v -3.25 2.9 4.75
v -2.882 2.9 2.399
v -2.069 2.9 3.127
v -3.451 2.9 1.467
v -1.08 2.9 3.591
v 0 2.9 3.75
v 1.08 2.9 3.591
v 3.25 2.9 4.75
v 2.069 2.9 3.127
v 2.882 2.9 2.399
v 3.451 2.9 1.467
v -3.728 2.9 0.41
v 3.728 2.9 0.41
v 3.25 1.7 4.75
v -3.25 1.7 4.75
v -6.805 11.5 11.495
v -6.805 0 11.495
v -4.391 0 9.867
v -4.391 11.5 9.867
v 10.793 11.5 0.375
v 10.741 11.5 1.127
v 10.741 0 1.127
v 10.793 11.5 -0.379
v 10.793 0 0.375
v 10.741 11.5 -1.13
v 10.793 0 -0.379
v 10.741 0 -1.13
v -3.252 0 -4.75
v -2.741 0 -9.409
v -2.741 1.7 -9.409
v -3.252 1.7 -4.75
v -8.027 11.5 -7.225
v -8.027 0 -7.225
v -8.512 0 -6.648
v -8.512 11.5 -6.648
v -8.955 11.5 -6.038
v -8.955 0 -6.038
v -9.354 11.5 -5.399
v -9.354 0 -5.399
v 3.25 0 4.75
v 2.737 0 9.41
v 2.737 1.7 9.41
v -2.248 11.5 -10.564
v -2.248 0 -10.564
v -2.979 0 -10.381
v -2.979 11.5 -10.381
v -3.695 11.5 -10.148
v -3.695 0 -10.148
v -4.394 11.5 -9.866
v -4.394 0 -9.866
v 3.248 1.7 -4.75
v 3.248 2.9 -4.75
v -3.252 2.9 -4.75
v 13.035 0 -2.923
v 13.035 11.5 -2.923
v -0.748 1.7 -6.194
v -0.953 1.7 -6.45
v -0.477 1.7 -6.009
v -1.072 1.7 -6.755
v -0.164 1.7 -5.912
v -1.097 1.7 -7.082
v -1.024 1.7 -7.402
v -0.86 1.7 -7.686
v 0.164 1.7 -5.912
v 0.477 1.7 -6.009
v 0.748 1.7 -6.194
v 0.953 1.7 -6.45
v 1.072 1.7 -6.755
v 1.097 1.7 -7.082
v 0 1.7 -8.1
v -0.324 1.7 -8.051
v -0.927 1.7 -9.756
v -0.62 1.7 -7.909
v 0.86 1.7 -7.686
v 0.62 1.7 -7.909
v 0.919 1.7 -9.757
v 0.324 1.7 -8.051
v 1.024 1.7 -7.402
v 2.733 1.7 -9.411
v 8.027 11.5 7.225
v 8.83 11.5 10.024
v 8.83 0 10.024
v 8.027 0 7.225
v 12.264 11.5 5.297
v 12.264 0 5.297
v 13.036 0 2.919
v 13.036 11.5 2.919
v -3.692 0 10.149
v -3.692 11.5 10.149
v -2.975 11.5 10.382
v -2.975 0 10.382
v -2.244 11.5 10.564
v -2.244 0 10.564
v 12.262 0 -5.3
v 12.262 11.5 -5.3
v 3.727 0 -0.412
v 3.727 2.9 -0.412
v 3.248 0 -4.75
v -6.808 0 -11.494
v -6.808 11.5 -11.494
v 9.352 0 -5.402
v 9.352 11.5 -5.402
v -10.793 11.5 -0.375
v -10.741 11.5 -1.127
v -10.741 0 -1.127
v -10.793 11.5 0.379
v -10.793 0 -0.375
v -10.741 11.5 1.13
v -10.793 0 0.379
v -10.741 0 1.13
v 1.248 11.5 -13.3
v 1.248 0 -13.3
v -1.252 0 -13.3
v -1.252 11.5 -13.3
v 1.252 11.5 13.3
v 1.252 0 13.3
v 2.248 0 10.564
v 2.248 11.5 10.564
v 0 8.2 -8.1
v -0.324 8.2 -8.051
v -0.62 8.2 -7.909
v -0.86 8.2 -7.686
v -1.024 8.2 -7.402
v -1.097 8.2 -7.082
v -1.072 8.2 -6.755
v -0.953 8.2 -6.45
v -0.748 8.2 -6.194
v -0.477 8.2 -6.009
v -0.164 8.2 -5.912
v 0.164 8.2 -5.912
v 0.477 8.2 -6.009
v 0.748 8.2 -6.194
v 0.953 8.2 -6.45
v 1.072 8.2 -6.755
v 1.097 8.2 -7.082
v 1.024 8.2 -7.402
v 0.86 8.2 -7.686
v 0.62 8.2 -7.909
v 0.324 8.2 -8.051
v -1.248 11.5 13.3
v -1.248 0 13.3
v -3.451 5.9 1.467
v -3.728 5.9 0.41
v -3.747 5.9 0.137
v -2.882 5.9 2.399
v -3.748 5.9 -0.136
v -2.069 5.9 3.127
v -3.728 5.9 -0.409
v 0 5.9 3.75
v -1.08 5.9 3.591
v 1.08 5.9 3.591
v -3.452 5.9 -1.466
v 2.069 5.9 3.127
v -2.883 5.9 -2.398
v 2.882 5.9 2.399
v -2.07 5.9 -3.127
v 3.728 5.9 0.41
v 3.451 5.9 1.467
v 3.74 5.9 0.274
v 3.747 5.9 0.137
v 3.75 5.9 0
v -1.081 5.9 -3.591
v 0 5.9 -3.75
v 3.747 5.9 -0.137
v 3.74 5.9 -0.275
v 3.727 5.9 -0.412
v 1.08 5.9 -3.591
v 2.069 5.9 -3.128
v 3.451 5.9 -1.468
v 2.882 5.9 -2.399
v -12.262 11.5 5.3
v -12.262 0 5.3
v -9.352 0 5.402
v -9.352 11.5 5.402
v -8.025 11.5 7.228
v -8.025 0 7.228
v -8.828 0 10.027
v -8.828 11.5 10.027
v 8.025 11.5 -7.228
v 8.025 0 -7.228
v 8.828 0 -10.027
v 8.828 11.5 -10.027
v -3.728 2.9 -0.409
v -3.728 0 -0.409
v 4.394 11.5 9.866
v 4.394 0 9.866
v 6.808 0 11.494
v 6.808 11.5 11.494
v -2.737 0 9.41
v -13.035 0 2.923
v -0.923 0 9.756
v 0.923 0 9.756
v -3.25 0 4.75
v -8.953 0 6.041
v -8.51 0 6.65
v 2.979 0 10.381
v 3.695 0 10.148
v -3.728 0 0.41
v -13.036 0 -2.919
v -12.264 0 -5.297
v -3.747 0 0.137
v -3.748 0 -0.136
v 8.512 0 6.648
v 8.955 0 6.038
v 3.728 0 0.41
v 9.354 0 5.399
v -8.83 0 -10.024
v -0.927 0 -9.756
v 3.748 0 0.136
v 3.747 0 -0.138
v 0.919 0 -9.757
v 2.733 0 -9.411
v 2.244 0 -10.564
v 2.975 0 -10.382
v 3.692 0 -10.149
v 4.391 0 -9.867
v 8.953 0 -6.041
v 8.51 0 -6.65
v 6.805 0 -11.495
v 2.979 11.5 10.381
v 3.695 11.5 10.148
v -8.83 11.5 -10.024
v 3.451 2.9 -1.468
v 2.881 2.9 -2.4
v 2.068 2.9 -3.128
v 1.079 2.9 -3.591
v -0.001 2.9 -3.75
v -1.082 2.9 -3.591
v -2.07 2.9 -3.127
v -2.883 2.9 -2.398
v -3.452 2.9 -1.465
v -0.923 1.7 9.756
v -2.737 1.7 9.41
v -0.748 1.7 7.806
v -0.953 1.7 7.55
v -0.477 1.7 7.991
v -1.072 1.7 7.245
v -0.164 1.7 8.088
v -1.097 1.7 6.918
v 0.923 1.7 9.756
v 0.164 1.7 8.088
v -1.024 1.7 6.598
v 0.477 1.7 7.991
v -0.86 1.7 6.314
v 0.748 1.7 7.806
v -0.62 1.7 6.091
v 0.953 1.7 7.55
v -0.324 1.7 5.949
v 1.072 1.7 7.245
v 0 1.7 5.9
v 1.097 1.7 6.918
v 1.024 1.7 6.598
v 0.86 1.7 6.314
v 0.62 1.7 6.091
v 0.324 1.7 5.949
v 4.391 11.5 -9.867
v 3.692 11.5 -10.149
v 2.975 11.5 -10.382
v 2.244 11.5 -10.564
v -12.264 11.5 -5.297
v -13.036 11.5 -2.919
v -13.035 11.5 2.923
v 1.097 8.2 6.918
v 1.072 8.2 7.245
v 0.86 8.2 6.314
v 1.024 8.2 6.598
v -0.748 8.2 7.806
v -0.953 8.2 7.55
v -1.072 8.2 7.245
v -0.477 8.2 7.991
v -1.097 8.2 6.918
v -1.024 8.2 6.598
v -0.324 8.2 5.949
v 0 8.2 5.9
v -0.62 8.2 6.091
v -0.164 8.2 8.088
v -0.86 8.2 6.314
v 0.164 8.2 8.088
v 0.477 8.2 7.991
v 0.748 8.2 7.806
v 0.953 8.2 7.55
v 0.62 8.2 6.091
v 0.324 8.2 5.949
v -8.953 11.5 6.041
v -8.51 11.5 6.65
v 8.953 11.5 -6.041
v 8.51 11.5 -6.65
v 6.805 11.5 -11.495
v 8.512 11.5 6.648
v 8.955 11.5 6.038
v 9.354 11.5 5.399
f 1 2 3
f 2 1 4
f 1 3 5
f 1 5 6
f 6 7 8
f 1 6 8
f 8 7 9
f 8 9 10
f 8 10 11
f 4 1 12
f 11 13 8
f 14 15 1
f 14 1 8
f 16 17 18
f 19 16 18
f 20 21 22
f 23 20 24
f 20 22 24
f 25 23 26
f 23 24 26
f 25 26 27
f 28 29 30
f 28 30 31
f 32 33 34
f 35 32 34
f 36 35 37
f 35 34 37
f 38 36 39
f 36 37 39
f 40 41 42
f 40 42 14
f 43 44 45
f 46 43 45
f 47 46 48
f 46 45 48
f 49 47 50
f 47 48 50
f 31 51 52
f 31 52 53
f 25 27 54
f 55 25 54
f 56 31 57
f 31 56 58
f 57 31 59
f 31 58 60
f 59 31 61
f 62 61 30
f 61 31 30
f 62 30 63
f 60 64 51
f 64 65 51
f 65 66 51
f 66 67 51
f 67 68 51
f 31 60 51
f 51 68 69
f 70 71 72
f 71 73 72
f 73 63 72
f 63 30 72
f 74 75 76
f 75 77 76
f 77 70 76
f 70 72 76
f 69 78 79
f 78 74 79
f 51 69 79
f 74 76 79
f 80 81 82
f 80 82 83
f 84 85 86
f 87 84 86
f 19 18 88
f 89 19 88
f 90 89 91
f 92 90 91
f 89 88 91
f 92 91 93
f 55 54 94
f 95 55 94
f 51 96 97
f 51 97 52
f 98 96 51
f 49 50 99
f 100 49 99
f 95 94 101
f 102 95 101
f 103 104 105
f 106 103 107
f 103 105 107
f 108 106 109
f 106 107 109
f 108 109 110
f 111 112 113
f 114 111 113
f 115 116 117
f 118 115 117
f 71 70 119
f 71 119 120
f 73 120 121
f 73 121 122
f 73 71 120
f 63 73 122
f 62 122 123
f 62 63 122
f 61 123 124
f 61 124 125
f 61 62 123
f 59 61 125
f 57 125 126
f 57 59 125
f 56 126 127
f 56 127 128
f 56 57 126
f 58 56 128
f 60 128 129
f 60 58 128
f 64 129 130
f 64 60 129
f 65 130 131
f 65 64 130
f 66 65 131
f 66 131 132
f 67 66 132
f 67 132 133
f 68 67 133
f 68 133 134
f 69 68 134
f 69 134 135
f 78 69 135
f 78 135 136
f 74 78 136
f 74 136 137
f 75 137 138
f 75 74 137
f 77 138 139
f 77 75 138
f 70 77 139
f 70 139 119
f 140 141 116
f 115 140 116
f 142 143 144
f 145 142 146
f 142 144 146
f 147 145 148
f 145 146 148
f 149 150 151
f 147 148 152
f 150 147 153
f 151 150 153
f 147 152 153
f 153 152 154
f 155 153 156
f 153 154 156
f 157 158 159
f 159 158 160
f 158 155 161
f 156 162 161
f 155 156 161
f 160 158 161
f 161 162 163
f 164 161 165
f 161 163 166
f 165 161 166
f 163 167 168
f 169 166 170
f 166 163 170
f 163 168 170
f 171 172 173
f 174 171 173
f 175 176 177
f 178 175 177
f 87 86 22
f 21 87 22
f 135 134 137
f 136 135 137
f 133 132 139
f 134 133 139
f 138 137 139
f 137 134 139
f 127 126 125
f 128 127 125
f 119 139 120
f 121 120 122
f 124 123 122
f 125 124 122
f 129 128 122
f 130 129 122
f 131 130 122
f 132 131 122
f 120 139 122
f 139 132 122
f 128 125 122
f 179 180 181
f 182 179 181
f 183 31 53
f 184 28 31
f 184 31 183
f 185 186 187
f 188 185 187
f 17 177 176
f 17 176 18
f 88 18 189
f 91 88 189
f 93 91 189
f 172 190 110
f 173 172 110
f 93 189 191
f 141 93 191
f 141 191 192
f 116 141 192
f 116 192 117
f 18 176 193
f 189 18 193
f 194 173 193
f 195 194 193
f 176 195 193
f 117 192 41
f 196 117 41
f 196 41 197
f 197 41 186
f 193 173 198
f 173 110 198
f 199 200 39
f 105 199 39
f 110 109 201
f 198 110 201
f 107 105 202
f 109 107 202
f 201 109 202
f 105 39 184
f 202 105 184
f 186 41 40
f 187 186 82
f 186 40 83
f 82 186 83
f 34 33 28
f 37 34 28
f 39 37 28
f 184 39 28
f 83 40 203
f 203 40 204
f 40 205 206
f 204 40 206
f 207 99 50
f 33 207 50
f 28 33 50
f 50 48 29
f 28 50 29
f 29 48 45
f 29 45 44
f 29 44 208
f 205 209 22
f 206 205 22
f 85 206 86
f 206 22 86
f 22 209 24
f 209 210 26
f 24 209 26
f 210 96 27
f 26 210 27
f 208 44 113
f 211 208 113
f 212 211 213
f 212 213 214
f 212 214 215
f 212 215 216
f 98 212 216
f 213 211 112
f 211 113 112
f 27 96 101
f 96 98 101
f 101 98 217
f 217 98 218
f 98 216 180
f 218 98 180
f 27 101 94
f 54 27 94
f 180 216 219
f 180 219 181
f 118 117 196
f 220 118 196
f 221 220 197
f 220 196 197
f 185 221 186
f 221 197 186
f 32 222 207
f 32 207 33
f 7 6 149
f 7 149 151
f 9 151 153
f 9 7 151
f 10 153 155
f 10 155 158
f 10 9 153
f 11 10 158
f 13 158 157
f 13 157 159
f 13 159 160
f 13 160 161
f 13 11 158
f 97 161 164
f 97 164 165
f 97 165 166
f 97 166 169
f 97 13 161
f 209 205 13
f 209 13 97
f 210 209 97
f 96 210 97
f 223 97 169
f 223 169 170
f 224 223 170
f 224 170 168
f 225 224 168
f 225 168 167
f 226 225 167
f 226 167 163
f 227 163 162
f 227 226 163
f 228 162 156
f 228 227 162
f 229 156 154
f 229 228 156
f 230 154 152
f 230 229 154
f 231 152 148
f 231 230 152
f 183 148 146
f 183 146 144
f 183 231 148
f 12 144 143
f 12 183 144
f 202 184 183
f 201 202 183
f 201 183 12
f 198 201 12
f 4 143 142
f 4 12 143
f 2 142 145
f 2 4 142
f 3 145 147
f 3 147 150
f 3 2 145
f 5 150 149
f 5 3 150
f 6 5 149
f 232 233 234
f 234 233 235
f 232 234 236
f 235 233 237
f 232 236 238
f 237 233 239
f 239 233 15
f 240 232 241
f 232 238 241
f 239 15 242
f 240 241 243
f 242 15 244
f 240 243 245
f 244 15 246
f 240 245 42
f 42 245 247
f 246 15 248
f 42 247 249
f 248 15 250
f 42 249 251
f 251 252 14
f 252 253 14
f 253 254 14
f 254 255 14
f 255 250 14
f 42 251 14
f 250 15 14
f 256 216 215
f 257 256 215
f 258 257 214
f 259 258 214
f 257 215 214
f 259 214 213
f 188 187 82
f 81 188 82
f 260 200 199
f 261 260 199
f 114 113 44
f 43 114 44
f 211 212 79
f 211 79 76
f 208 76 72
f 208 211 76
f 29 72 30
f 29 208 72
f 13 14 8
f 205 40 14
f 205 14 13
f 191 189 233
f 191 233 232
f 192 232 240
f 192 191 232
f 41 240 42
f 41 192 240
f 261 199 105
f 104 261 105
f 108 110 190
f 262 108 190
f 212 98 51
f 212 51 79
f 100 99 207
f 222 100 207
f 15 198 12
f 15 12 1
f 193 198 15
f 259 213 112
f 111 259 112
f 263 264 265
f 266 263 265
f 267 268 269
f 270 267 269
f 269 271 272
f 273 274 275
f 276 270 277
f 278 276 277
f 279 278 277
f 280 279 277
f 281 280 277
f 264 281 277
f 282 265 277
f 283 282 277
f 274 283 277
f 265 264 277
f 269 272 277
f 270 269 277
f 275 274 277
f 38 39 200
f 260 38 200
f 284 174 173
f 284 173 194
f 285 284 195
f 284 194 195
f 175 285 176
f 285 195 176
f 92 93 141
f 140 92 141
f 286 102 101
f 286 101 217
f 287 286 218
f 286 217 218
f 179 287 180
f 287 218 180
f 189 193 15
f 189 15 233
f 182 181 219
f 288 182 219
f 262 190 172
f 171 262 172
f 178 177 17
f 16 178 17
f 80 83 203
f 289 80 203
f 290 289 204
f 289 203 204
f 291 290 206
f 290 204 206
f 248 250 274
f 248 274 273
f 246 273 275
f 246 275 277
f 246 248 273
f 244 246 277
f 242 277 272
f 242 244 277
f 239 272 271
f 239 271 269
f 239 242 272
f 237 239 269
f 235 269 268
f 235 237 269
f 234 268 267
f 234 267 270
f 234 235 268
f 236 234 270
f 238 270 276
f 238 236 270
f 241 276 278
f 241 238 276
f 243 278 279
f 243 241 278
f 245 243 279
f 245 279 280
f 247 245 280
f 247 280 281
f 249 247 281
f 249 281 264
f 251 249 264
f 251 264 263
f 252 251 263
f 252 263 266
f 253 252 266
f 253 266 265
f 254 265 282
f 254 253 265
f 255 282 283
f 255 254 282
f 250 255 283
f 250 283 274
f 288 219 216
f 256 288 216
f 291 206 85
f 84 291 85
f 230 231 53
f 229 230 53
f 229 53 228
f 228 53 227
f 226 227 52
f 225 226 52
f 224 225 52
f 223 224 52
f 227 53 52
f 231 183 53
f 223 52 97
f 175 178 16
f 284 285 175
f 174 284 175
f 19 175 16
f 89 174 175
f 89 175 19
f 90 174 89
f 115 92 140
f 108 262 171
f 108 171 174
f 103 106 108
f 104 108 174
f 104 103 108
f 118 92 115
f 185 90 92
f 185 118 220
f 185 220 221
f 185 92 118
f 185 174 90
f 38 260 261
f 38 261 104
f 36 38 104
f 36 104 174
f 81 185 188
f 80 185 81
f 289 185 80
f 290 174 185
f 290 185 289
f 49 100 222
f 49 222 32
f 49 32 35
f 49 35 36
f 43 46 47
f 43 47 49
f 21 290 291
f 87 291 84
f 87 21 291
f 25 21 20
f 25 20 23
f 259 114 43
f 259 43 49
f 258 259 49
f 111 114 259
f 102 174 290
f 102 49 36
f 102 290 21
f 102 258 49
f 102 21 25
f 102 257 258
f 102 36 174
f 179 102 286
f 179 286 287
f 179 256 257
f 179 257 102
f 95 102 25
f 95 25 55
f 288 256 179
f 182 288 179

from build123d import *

# Parameters (mm, degrees)
CROQUIS1_R              = 3.75
SALIENTE_EXTRUIR1_DEPTH = 11.5
CROQUIS1_4_R            = 1.1
CORTAR_EXTRUIR1_DEPTH   = 1.7
CORTAR_EXTRUIR2_START   = 1.7
CORTAR_EXTRUIR2_DEPTH   = 1.2
CUT_EXTRUDE1_START      = 1.7
CROQUIS1_7_R            = 1.1
CUT_EXTRUDE1_DEPTH      = 6.5
BOSS_EXTRUDE1_START     = 11.5
BOSS_EXTRUDE1_DEPTH     = 5.6


with BuildPart() as part:
    # Croquis1 → Saliente-Extruir1 (new body)
    with BuildSketch(Plane(origin=(0, 0, 0), x_dir=(1, 0, 0), z_dir=(0, 1, 0))):
        with BuildLine():
            Line((1.248257156, 13.300370373), (-1.251742735, 13.299629349))
            Line((-1.251742735, 13.299629349), (-2.247599184, 10.563536241))
            ThreePointArc((-2.247599184, 10.563536241), (-3.339078028, 10.270859649), (-4.394000333, 9.865736722))
            Line((-4.394000333, 9.865736722), (-6.807900303, 11.493932811))
            Line((-6.807900303, 11.493932811), (-8.830007137, 10.023870243))
            Line((-8.830007137, 10.023870243), (-8.027436751, 7.224974686))
            ThreePointArc((-8.027436751, 7.224974686), (-8.7384307, 6.346639181), (-9.353755491, 5.398820076))
            Line((-9.353755491, 5.398820076), (-12.263671238, 5.297203579))
            Line((-12.263671238, 5.297203579), (-13.035508935, 2.919333403))
            Line((-13.035508935, 2.919333403), (-10.741066321, 1.126718369))
            ThreePointArc((-10.741066321, 1.126718369), (-10.799999853, -0.001781739), (-10.740693974, -1.13026234))
            Line((-10.740693974, -1.13026234), (-13.035136587, -2.922877375))
            Line((-13.035136587, -2.922877375), (-12.261889379, -5.300289572))
            Line((-12.261889379, -5.300289572), (-9.351973632, -5.401906069))
            ThreePointArc((-9.351973632, -5.401906069), (-8.73633614, -6.349522096), (-8.025052421, -7.227622959))
            Line((-8.025052421, -7.227622959), (-8.827622808, -10.026518516))
            Line((-8.827622808, -10.026518516), (-6.804644848, -11.495382082))
            Line((-6.804644848, -11.495382082), (-4.390744878, -9.867185993))
            ThreePointArc((-4.390744878, -9.867185993), (-3.335688959, -10.271960824), (-2.244113605, -10.564277265))
            Line((-2.244113605, -10.564277265), (-1.248257156, -13.300370373))
            Line((-1.248257156, -13.300370373), (1.251742735, -13.299629349))
            Line((1.251742735, -13.299629349), (2.247599184, -10.563536241))
            ThreePointArc((2.247599184, -10.563536241), (3.339078028, -10.270859649), (4.394000333, -9.865736722))
            Line((4.394000333, -9.865736722), (6.807900303, -11.493932811))
            Line((6.807900303, -11.493932811), (8.830007137, -10.023870243))
            Line((8.830007137, -10.023870243), (8.027436751, -7.224974686))
            ThreePointArc((8.027436751, -7.224974686), (8.7384307, -6.346639181), (9.353755491, -5.398820076))
            Line((9.353755491, -5.398820076), (12.263671238, -5.297203579))
            Line((12.263671238, -5.297203579), (13.035508935, -2.919333403))
            Line((13.035508935, -2.919333403), (10.741066321, -1.126718369))
            ThreePointArc((10.741066321, -1.126718369), (10.799999853, 0.001781739), (10.740693974, 1.13026234))
            Line((10.740693974, 1.13026234), (13.035136587, 2.922877375))
            Line((13.035136587, 2.922877375), (12.261889379, 5.300289572))
            Line((12.261889379, 5.300289572), (9.351973632, 5.401906069))
            ThreePointArc((9.351973632, 5.401906069), (8.73633614, 6.349522096), (8.025052421, 7.227622959))
            Line((8.025052421, 7.227622959), (8.827622808, 10.026518516))
            Line((8.827622808, 10.026518516), (6.804644848, 11.495382082))
            Line((6.804644848, 11.495382082), (4.390744878, 9.867185993))
            ThreePointArc((4.390744878, 9.867185993), (3.335688959, 10.271960824), (2.244113605, 10.564277265))
            Line((2.244113605, 10.564277265), (1.248257156, 13.300370373))
        make_face()
        with Locations(Location((0, 0, 0), (0, 0, 270))):
            Circle(CROQUIS1_R, mode=Mode.SUBTRACT)
    extrude(amount=SALIENTE_EXTRUIR1_DEPTH)

    # Croquis1<4> → Cortar-Extruir1 (cut)
    with BuildSketch(Plane(origin=(0, 0, 0), x_dir=(1, 0, 0), z_dir=(0, 1, 0))):
        with BuildLine():
            ThreePointArc((3.727502093, -0.41015625), (0, -3.75), (-3.727502093, -0.41015625))
            Line((-3.727502093, -0.41015625), (-3.249966737, -4.75))
            Line((-3.249966737, -4.75), (3.249966737, -4.75))
            Line((3.249966737, -4.75), (3.727502093, -0.41015625))
        make_face()
        with BuildLine():
            Line((3.249966737, -4.75), (-3.249966737, -4.75))
            Line((-3.249966737, -4.75), (-2.737205389, -9.409977746))
            ThreePointArc((-2.737205389, -9.409977746), (0, -9.7999987), (2.737205389, -9.409977746))
            Line((2.737205389, -9.409977746), (3.249966737, -4.75))
        make_face()
        with Locations((0, -7)):
            Circle(CROQUIS1_4_R, mode=Mode.SUBTRACT)
        with BuildLine():
            Line((3.248223947, 4.75), (-3.251709526, 4.75))
            Line((-3.251709526, 4.75), (-3.727664518, 0.408677426))
            ThreePointArc((-3.727664518, 0.408677426), (-0.001487905, 3.749999705), (3.727339039, 0.411635384))
            Line((3.727339039, 0.411635384), (3.248223947, 4.75))
        make_face()
        with BuildLine():
            Line((-2.740938342, 9.408891089), (-3.251709526, 4.75))
            Line((-3.251709526, 4.75), (3.248223947, 4.75))
            Line((3.248223947, 4.75), (2.733471058, 9.411063197))
            ThreePointArc((2.733471058, 9.411063197), (-0.003888392, 9.799997928), (-2.740938342, 9.408891089))
        make_face()
        with Locations((0, 7)):
            Circle(CROQUIS1_4_R, mode=Mode.SUBTRACT)
        with Locations((0, 7)):
            Circle(CROQUIS1_4_R)
        with Locations((0, -7)):
            Circle(CROQUIS1_4_R)
    extrude(amount=CORTAR_EXTRUIR1_DEPTH, mode=Mode.SUBTRACT)

    # Croquis1<5> → Cortar-Extruir2 (cut)
    with BuildSketch(Plane(origin=(0, 0, 0), x_dir=(1, 0, 0), z_dir=(0, 1, 0)).offset(CORTAR_EXTRUIR2_START)):
        with BuildLine():
            Line((3.248223947, 4.75), (-3.251709526, 4.75))
            Line((-3.251709526, 4.75), (-3.727664518, 0.408677426))
            ThreePointArc((-3.727664518, 0.408677426), (-0.001487905, 3.749999705), (3.727339039, 0.411635384))
            Line((3.727339039, 0.411635384), (3.248223947, 4.75))
        make_face()
        with BuildLine():
            ThreePointArc((3.727502093, -0.41015625), (0, -3.75), (-3.727502093, -0.41015625))
            Line((-3.727502093, -0.41015625), (-3.249966737, -4.75))
            Line((-3.249966737, -4.75), (3.249966737, -4.75))
            Line((3.249966737, -4.75), (3.727502093, -0.41015625))
        make_face()
    extrude(amount=CORTAR_EXTRUIR2_DEPTH, mode=Mode.SUBTRACT)

    # Croquis1<7> → Cut-Extrude1 (cut)
    with BuildSketch(Plane(origin=(0, 0, 0), x_dir=(1, 0, 0), z_dir=(0, 1, 0)).offset(CUT_EXTRUDE1_START)):
        with Locations(Location((0, -7, 0), (0, 0, 90))):
            Circle(CROQUIS1_7_R)
        with Locations(Location((0, 7, 0), (0, 0, 90))):
            Circle(CROQUIS1_7_R)
    extrude(amount=CUT_EXTRUDE1_DEPTH, mode=Mode.SUBTRACT)

    # Croquis1<10> → Boss-Extrude1 (add)
    with BuildSketch(Plane(origin=(0, 0, 0), x_dir=(1, 0, 0), z_dir=(0, 1, 0)).offset(BOSS_EXTRUDE1_START)):
        with BuildLine():
            ThreePointArc((0, 1.6), (-1.6, 0), (0, -1.6))
            Line((0, -1.6), (0, 1.6))
        make_face()
        with BuildLine():
            Line((0, 1.6), (0, -1.6))
            ThreePointArc((0, -1.6), (1.13137085, -1.13137085), (1.6, 0))
            ThreePointArc((1.6, 0), (1.13137085, 1.13137085), (0, 1.6))
        make_face()
        with BuildLine():
            ThreePointArc((0, 2.6), (-2.6, 0), (0, -2.6))
            Line((0, -2.6), (0, -1.6))
            ThreePointArc((0, -1.6), (-1.6, 0), (0, 1.6))
            Line((0, 1.6), (0, 2.6))
        make_face()
        with BuildLine():
            Line((0, -1.6), (0, -2.6))
            ThreePointArc((0, -2.6), (1.838477631, -1.838477631), (2.6, 0))
            ThreePointArc((2.6, 0), (1.838477631, 1.838477631), (0, 2.6))
            Line((0, 2.6), (0, 1.6))
            ThreePointArc((0, 1.6), (1.13137085, 1.13137085), (1.6, 0))
            ThreePointArc((1.6, 0), (1.13137085, -1.13137085), (0, -1.6))
        make_face()
        with BuildLine():
            ThreePointArc((-3.727502093, -0.41015625), (-2.502440215, -2.792900458), (0, -3.75))
            Line((0, -3.75), (0, -2.6))
            ThreePointArc((0, -2.6), (-2.6, 0), (0, 2.6))
            Line((0, 2.6), (0, 3.75))
            ThreePointArc((0, 3.75), (-2.502994172, 2.792404013), (-3.727664518, 0.408677426))
            ThreePointArc((-3.727664518, 0.408677426), (-3.749999926, -0.000743858), (-3.727502093, -0.41015625))
        make_face()
        with BuildLine():
            Line((0, -2.6), (0, -3.75))
            ThreePointArc((0, -3.75), (2.502440215, -2.792900458), (3.727502093, -0.41015625))
            ThreePointArc((3.727502093, -0.41015625), (3.744371299, -0.205386407), (3.75, 0))
            ThreePointArc((3.75, 0), (3.744330474, 0.206129334), (3.727339039, 0.411635384))
            ThreePointArc((3.727339039, 0.411635384), (2.50188602, 2.793396919), (0, 3.75))
            Line((0, 3.75), (0, 2.6))
            ThreePointArc((0, 2.6), (1.838477631, 1.838477631), (2.6, 0))
            ThreePointArc((2.6, 0), (1.838477631, -1.838477631), (0, -2.6))
        make_face()
    extrude(amount=-BOSS_EXTRUDE1_DEPTH)


solid = part.part
